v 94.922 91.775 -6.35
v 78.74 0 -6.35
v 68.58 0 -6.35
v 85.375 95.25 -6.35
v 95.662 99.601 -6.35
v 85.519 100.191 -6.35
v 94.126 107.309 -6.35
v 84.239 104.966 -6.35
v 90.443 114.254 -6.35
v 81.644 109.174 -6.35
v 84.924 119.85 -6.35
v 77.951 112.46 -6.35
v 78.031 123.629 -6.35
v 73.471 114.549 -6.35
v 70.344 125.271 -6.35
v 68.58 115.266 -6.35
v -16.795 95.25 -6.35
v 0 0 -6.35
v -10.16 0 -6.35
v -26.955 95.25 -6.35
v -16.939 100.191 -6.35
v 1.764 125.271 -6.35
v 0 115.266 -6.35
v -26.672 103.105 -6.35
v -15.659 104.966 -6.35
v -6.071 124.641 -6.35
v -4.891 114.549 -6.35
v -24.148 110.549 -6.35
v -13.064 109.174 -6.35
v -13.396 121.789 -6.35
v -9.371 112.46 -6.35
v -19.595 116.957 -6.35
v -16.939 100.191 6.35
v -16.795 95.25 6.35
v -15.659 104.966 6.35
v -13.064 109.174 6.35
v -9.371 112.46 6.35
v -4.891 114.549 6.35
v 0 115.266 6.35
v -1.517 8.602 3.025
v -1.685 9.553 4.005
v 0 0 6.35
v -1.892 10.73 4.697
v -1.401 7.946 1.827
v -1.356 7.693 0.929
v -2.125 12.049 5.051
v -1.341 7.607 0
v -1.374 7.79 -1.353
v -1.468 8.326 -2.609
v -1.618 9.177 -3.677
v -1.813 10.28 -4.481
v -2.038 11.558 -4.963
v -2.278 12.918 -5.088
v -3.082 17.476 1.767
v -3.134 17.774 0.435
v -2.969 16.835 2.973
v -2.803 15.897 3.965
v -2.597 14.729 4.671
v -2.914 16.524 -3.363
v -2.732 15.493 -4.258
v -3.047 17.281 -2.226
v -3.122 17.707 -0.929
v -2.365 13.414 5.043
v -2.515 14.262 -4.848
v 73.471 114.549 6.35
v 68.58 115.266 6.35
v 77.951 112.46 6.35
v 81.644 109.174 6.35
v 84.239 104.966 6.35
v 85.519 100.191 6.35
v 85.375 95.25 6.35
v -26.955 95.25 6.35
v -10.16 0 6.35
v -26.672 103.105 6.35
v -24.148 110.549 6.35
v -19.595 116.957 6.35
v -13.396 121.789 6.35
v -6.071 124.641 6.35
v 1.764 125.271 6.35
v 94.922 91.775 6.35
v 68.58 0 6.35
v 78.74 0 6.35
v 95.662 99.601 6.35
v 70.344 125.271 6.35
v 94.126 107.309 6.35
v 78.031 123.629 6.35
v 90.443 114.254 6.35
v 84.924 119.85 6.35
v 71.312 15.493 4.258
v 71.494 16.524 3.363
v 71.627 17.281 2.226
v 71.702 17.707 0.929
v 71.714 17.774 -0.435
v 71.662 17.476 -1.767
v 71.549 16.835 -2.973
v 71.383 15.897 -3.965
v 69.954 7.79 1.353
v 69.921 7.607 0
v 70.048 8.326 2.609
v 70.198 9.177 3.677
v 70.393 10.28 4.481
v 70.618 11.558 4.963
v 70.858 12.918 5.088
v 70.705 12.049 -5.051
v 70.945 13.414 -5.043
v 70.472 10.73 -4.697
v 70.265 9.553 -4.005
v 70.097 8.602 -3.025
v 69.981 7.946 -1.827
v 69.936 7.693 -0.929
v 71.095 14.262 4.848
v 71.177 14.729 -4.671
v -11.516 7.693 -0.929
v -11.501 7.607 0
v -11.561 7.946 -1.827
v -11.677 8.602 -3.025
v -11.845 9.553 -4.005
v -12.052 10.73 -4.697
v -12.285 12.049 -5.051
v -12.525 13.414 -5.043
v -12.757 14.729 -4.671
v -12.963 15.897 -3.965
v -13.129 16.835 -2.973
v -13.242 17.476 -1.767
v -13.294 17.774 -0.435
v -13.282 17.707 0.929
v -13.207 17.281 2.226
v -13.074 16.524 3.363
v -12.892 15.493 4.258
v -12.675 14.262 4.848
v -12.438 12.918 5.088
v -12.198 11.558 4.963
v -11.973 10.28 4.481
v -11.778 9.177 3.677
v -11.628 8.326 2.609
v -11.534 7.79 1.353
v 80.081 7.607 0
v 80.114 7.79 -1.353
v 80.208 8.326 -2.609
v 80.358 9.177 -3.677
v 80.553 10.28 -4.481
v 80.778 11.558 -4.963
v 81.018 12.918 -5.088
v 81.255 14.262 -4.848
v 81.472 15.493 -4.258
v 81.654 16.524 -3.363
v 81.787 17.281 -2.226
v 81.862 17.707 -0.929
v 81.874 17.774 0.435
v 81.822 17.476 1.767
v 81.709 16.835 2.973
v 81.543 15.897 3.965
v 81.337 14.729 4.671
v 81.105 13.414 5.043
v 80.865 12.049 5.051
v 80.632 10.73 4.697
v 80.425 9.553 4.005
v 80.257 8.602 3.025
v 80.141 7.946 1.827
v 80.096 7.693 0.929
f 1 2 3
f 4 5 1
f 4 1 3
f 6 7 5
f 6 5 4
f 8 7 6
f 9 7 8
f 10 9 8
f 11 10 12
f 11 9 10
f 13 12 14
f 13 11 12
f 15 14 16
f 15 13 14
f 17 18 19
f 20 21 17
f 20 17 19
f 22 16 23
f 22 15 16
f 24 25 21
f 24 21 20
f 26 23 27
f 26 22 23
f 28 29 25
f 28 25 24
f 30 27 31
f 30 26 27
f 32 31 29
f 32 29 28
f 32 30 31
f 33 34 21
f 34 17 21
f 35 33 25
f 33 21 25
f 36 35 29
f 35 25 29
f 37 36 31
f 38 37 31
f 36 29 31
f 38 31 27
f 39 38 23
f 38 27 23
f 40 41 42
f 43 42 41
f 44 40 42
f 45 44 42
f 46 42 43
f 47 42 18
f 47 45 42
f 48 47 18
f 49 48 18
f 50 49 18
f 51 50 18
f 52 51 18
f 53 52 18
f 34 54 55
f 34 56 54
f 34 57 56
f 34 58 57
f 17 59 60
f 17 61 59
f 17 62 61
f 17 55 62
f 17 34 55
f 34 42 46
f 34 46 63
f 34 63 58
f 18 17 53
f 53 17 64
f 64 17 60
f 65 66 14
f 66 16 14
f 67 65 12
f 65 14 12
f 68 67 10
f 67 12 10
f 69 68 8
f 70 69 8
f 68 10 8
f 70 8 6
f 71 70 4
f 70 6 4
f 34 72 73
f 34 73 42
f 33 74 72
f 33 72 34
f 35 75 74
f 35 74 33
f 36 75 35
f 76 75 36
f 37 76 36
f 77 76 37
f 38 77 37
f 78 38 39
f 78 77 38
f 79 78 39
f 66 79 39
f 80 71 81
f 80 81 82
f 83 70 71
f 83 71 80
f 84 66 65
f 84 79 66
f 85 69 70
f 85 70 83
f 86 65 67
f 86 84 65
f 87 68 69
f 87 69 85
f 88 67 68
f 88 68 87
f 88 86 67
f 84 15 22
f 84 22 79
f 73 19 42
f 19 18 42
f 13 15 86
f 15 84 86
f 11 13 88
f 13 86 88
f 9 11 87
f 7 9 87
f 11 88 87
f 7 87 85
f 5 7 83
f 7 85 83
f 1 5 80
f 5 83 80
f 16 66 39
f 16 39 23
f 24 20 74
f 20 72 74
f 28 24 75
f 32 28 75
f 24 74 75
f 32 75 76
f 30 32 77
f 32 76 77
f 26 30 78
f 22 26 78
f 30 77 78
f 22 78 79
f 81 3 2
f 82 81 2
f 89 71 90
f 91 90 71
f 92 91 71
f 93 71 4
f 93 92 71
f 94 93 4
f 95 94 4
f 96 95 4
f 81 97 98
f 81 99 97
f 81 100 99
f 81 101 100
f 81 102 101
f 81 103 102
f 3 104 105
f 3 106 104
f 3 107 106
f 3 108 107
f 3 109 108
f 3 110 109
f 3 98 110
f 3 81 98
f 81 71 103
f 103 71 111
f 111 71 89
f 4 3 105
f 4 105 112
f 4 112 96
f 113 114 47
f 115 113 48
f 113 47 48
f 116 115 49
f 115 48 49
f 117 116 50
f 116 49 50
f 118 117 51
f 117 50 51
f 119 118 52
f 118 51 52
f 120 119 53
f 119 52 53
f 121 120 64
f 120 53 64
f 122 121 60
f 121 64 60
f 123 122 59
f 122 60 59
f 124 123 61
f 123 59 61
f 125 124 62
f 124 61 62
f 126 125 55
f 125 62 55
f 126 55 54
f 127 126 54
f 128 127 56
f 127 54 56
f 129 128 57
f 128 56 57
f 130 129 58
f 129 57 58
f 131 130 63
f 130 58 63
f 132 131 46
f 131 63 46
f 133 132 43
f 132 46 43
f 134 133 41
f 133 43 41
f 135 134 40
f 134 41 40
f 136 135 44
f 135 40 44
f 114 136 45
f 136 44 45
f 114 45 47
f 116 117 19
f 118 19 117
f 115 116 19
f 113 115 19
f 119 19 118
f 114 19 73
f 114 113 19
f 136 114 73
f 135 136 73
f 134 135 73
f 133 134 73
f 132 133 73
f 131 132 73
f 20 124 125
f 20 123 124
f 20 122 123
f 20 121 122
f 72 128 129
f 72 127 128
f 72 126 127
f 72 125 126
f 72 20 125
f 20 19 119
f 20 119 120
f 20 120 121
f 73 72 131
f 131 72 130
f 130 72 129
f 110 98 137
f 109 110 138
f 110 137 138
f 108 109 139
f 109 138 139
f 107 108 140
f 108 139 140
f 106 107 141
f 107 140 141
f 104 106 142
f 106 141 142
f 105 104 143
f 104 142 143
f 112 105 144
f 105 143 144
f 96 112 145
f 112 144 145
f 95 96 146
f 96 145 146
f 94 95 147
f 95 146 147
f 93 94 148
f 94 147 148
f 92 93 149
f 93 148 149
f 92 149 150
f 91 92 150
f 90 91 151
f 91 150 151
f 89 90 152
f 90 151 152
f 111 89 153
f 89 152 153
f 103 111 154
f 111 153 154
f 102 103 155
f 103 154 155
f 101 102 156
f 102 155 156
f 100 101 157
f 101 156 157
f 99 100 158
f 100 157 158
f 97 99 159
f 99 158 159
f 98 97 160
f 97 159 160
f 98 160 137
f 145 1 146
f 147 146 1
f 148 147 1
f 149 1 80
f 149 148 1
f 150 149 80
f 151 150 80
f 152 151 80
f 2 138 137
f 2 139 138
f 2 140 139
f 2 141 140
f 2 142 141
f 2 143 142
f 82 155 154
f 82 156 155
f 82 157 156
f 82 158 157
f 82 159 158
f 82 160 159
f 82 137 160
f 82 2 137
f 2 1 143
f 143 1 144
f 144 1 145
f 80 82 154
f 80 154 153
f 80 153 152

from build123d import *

# Parameters (mm, degrees)
SKETCH2_W          = 10.16
SKETCH2_H          = 12.7
SKETCH3_W          = 10.16
SKETCH3_H          = 12.7
CUT_EXTRUDE1_DEPTH = 5.08
SKETCH5_R          = 5.092900553
CUT_EXTRUDE2_DEPTH = 127


with BuildPart() as part:
    # Sweep2: sweep along a path in Sketch1
    with BuildLine(Plane.XY) as sweep2_path:
        Line((0, 0), (-16.795144912, 95.25))
        ThreePointArc((-16.795144912, 95.25), (-13.064303558, 109.17368949), (0, 115.265674288))
        Line((0, 115.265674288), (68.58, 115.265674288))
        ThreePointArc((68.58, 115.265674288), (81.644303558, 109.17368949), (85.375144912, 95.25))
        Line((85.375144912, 95.25), (68.58, 0))
    # Sketch2 → Sweep2 (sweep)
    with BuildSketch(Plane(origin=(0, 0, 0), x_dir=(1, 0, 0), z_dir=(0, 1, 0))):
        with Locations((-5.08, 0)):
            Rectangle(SKETCH2_W, SKETCH2_H)
    sweep(path=sweep2_path.line)

    # Sketch3 → Cut-Extrude1 (cut)
    with BuildSketch(Plane(origin=(0, 0, 0), x_dir=(1, 0, 0), z_dir=(0, 1, 0))):
        with Locations((73.66, 0)):
            Rectangle(SKETCH3_W, SKETCH3_H)
    extrude(amount=-CUT_EXTRUDE1_DEPTH, mode=Mode.SUBTRACT)

    # Sketch5 → Cut-Extrude2 (cut, symmetric)
    with BuildSketch(Plane(origin=(0, 0, 0), x_dir=(0, 0, -1), z_dir=(1, 0, 0))):
        with Locations(Location((0, 12.7, 0), (0, 0, 270))):
            Circle(SKETCH5_R)
    extrude(amount=CUT_EXTRUDE2_DEPTH, both=True, mode=Mode.SUBTRACT)


solid = part.part
